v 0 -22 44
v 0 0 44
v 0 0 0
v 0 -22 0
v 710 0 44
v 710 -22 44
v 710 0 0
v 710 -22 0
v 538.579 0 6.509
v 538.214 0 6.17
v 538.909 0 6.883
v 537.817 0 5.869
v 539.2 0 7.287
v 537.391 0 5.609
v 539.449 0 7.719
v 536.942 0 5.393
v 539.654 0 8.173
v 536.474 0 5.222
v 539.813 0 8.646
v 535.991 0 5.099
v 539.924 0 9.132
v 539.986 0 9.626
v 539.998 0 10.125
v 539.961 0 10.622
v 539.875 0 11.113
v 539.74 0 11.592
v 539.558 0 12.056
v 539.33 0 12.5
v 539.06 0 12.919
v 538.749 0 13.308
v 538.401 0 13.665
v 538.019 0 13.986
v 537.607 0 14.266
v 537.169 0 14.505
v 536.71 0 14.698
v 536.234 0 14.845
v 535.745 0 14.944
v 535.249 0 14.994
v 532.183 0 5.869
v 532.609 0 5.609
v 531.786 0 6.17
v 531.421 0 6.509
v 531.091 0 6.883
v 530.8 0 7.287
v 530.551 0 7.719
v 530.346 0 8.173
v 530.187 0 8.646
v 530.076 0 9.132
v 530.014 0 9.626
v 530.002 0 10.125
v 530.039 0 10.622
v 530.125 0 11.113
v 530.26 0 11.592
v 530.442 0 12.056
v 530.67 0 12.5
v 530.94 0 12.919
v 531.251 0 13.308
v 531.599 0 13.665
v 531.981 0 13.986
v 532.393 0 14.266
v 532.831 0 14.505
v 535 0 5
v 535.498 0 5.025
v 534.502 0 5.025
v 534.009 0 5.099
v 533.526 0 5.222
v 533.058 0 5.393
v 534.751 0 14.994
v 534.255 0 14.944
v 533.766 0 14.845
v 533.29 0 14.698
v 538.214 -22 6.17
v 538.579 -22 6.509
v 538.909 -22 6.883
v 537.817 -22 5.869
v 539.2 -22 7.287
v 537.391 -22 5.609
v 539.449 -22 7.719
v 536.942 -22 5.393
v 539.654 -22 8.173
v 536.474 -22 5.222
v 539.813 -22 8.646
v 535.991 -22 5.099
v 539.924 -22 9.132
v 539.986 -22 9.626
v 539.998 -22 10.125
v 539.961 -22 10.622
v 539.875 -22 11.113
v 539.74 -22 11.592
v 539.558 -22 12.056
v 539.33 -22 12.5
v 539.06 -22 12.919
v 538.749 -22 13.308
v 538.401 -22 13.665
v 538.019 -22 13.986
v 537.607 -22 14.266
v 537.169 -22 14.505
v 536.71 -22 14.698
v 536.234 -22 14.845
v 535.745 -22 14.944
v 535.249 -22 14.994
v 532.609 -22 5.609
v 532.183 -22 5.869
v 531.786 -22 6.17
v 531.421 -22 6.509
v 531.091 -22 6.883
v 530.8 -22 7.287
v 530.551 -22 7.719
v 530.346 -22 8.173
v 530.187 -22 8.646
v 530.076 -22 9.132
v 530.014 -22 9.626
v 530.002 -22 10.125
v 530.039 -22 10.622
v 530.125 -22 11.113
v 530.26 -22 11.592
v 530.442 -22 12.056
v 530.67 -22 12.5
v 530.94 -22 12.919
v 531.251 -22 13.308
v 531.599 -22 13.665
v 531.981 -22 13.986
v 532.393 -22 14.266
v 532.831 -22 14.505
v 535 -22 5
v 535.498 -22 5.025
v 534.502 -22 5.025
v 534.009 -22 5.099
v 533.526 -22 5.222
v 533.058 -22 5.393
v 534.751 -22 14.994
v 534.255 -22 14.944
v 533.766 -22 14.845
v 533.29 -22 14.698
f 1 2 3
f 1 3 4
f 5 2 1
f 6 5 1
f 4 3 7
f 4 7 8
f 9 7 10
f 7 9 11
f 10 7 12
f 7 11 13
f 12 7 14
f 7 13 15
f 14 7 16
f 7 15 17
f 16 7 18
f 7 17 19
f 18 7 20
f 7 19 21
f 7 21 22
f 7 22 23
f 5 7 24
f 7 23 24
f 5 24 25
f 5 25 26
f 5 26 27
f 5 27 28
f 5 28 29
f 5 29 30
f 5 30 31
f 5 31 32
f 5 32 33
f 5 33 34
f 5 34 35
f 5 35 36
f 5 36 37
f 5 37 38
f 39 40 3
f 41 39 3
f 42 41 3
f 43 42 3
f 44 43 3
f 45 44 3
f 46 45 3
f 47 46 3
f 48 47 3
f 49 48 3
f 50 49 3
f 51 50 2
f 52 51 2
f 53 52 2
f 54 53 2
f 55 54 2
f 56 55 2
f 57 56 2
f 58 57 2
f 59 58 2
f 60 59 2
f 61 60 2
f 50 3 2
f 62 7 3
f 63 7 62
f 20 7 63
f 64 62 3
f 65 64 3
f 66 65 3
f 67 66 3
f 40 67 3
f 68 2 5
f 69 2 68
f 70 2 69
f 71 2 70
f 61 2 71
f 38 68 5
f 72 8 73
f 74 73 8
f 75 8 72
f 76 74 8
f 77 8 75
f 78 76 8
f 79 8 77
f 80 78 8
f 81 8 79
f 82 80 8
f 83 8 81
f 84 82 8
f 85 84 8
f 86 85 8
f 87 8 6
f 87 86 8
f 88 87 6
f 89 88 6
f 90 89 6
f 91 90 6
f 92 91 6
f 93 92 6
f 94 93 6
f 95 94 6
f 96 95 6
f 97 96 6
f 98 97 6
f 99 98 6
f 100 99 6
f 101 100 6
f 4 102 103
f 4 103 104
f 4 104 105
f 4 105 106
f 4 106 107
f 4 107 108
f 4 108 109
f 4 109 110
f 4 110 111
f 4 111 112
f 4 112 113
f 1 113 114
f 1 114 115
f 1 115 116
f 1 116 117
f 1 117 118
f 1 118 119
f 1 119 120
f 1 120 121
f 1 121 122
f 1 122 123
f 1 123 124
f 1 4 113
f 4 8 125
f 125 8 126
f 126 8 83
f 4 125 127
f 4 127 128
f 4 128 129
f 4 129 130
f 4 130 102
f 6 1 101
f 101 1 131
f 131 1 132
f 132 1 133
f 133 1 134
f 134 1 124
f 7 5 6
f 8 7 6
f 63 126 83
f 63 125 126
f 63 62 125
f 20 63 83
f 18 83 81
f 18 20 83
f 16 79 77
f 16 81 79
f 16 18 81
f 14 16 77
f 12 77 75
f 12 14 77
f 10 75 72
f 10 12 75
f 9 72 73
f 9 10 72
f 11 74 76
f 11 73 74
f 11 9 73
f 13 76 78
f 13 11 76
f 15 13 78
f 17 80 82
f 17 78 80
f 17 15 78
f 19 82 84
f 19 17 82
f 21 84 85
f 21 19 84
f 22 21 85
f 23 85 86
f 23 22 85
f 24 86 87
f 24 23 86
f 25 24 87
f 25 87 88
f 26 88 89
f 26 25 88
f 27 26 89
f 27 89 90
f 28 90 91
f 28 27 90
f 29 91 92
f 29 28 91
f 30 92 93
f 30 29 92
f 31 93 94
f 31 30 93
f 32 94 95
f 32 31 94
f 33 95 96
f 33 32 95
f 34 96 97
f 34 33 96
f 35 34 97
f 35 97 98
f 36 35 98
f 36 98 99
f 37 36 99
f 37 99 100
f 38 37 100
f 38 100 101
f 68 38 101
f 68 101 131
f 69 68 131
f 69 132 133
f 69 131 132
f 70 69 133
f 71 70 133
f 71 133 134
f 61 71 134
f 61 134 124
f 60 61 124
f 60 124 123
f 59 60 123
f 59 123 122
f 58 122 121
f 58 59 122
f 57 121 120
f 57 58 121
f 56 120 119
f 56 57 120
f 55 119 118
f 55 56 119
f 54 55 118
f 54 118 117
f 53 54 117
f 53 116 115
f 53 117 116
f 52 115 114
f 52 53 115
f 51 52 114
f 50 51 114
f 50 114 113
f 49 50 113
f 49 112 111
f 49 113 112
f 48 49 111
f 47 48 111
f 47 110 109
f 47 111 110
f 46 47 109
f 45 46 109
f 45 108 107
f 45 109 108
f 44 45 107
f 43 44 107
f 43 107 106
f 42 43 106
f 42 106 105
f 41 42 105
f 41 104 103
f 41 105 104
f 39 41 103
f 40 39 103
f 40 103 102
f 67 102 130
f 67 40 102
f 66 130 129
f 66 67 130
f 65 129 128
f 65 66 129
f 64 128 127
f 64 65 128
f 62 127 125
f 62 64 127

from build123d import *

# Parameters (mm, degrees)
CYLINDER_R           = 5
CYLINDER_DEPTH       = 100
CYLINDER_PITCH_ANGLE = 90
SKETCH_W             = 22
SKETCH_H             = 44
PAD_DEPTH            = 710
CUT_PLACEMENT_ANGLE  = -90


with BuildPart() as cylinder:
    # Cylinder → Cylinder (new body)
    with BuildSketch(Plane.XY):
        Circle(CYLINDER_R)
    extrude(amount=CYLINDER_DEPTH)


with BuildPart() as cylinder_1:
    # Cylinder pitch: moved
    add(cylinder.part.rotate(Axis((0, 0, 0), (0, 1, 0)), CYLINDER_PITCH_ANGLE))


with BuildPart() as cylinder_2:
    # Cylinder placement: moved
    add(cylinder_1.part.moved(Location((-50, 535, 10))))


with BuildPart() as cut:
    # Sketch → Pad (new body)
    with BuildSketch(Plane.XZ):
        with Locations((11, 22)):
            Rectangle(SKETCH_W, SKETCH_H)
    extrude(amount=-PAD_DEPTH)

    # Cut: cut Cylinder
    add(cylinder_2.part, mode=Mode.SUBTRACT)


with BuildPart() as cut_1:
    # Cut placement: moved
    add(cut.part.rotate(Axis((0, 0, 0), (0, 0, 1)), CUT_PLACEMENT_ANGLE))


solid = cut_1.part
